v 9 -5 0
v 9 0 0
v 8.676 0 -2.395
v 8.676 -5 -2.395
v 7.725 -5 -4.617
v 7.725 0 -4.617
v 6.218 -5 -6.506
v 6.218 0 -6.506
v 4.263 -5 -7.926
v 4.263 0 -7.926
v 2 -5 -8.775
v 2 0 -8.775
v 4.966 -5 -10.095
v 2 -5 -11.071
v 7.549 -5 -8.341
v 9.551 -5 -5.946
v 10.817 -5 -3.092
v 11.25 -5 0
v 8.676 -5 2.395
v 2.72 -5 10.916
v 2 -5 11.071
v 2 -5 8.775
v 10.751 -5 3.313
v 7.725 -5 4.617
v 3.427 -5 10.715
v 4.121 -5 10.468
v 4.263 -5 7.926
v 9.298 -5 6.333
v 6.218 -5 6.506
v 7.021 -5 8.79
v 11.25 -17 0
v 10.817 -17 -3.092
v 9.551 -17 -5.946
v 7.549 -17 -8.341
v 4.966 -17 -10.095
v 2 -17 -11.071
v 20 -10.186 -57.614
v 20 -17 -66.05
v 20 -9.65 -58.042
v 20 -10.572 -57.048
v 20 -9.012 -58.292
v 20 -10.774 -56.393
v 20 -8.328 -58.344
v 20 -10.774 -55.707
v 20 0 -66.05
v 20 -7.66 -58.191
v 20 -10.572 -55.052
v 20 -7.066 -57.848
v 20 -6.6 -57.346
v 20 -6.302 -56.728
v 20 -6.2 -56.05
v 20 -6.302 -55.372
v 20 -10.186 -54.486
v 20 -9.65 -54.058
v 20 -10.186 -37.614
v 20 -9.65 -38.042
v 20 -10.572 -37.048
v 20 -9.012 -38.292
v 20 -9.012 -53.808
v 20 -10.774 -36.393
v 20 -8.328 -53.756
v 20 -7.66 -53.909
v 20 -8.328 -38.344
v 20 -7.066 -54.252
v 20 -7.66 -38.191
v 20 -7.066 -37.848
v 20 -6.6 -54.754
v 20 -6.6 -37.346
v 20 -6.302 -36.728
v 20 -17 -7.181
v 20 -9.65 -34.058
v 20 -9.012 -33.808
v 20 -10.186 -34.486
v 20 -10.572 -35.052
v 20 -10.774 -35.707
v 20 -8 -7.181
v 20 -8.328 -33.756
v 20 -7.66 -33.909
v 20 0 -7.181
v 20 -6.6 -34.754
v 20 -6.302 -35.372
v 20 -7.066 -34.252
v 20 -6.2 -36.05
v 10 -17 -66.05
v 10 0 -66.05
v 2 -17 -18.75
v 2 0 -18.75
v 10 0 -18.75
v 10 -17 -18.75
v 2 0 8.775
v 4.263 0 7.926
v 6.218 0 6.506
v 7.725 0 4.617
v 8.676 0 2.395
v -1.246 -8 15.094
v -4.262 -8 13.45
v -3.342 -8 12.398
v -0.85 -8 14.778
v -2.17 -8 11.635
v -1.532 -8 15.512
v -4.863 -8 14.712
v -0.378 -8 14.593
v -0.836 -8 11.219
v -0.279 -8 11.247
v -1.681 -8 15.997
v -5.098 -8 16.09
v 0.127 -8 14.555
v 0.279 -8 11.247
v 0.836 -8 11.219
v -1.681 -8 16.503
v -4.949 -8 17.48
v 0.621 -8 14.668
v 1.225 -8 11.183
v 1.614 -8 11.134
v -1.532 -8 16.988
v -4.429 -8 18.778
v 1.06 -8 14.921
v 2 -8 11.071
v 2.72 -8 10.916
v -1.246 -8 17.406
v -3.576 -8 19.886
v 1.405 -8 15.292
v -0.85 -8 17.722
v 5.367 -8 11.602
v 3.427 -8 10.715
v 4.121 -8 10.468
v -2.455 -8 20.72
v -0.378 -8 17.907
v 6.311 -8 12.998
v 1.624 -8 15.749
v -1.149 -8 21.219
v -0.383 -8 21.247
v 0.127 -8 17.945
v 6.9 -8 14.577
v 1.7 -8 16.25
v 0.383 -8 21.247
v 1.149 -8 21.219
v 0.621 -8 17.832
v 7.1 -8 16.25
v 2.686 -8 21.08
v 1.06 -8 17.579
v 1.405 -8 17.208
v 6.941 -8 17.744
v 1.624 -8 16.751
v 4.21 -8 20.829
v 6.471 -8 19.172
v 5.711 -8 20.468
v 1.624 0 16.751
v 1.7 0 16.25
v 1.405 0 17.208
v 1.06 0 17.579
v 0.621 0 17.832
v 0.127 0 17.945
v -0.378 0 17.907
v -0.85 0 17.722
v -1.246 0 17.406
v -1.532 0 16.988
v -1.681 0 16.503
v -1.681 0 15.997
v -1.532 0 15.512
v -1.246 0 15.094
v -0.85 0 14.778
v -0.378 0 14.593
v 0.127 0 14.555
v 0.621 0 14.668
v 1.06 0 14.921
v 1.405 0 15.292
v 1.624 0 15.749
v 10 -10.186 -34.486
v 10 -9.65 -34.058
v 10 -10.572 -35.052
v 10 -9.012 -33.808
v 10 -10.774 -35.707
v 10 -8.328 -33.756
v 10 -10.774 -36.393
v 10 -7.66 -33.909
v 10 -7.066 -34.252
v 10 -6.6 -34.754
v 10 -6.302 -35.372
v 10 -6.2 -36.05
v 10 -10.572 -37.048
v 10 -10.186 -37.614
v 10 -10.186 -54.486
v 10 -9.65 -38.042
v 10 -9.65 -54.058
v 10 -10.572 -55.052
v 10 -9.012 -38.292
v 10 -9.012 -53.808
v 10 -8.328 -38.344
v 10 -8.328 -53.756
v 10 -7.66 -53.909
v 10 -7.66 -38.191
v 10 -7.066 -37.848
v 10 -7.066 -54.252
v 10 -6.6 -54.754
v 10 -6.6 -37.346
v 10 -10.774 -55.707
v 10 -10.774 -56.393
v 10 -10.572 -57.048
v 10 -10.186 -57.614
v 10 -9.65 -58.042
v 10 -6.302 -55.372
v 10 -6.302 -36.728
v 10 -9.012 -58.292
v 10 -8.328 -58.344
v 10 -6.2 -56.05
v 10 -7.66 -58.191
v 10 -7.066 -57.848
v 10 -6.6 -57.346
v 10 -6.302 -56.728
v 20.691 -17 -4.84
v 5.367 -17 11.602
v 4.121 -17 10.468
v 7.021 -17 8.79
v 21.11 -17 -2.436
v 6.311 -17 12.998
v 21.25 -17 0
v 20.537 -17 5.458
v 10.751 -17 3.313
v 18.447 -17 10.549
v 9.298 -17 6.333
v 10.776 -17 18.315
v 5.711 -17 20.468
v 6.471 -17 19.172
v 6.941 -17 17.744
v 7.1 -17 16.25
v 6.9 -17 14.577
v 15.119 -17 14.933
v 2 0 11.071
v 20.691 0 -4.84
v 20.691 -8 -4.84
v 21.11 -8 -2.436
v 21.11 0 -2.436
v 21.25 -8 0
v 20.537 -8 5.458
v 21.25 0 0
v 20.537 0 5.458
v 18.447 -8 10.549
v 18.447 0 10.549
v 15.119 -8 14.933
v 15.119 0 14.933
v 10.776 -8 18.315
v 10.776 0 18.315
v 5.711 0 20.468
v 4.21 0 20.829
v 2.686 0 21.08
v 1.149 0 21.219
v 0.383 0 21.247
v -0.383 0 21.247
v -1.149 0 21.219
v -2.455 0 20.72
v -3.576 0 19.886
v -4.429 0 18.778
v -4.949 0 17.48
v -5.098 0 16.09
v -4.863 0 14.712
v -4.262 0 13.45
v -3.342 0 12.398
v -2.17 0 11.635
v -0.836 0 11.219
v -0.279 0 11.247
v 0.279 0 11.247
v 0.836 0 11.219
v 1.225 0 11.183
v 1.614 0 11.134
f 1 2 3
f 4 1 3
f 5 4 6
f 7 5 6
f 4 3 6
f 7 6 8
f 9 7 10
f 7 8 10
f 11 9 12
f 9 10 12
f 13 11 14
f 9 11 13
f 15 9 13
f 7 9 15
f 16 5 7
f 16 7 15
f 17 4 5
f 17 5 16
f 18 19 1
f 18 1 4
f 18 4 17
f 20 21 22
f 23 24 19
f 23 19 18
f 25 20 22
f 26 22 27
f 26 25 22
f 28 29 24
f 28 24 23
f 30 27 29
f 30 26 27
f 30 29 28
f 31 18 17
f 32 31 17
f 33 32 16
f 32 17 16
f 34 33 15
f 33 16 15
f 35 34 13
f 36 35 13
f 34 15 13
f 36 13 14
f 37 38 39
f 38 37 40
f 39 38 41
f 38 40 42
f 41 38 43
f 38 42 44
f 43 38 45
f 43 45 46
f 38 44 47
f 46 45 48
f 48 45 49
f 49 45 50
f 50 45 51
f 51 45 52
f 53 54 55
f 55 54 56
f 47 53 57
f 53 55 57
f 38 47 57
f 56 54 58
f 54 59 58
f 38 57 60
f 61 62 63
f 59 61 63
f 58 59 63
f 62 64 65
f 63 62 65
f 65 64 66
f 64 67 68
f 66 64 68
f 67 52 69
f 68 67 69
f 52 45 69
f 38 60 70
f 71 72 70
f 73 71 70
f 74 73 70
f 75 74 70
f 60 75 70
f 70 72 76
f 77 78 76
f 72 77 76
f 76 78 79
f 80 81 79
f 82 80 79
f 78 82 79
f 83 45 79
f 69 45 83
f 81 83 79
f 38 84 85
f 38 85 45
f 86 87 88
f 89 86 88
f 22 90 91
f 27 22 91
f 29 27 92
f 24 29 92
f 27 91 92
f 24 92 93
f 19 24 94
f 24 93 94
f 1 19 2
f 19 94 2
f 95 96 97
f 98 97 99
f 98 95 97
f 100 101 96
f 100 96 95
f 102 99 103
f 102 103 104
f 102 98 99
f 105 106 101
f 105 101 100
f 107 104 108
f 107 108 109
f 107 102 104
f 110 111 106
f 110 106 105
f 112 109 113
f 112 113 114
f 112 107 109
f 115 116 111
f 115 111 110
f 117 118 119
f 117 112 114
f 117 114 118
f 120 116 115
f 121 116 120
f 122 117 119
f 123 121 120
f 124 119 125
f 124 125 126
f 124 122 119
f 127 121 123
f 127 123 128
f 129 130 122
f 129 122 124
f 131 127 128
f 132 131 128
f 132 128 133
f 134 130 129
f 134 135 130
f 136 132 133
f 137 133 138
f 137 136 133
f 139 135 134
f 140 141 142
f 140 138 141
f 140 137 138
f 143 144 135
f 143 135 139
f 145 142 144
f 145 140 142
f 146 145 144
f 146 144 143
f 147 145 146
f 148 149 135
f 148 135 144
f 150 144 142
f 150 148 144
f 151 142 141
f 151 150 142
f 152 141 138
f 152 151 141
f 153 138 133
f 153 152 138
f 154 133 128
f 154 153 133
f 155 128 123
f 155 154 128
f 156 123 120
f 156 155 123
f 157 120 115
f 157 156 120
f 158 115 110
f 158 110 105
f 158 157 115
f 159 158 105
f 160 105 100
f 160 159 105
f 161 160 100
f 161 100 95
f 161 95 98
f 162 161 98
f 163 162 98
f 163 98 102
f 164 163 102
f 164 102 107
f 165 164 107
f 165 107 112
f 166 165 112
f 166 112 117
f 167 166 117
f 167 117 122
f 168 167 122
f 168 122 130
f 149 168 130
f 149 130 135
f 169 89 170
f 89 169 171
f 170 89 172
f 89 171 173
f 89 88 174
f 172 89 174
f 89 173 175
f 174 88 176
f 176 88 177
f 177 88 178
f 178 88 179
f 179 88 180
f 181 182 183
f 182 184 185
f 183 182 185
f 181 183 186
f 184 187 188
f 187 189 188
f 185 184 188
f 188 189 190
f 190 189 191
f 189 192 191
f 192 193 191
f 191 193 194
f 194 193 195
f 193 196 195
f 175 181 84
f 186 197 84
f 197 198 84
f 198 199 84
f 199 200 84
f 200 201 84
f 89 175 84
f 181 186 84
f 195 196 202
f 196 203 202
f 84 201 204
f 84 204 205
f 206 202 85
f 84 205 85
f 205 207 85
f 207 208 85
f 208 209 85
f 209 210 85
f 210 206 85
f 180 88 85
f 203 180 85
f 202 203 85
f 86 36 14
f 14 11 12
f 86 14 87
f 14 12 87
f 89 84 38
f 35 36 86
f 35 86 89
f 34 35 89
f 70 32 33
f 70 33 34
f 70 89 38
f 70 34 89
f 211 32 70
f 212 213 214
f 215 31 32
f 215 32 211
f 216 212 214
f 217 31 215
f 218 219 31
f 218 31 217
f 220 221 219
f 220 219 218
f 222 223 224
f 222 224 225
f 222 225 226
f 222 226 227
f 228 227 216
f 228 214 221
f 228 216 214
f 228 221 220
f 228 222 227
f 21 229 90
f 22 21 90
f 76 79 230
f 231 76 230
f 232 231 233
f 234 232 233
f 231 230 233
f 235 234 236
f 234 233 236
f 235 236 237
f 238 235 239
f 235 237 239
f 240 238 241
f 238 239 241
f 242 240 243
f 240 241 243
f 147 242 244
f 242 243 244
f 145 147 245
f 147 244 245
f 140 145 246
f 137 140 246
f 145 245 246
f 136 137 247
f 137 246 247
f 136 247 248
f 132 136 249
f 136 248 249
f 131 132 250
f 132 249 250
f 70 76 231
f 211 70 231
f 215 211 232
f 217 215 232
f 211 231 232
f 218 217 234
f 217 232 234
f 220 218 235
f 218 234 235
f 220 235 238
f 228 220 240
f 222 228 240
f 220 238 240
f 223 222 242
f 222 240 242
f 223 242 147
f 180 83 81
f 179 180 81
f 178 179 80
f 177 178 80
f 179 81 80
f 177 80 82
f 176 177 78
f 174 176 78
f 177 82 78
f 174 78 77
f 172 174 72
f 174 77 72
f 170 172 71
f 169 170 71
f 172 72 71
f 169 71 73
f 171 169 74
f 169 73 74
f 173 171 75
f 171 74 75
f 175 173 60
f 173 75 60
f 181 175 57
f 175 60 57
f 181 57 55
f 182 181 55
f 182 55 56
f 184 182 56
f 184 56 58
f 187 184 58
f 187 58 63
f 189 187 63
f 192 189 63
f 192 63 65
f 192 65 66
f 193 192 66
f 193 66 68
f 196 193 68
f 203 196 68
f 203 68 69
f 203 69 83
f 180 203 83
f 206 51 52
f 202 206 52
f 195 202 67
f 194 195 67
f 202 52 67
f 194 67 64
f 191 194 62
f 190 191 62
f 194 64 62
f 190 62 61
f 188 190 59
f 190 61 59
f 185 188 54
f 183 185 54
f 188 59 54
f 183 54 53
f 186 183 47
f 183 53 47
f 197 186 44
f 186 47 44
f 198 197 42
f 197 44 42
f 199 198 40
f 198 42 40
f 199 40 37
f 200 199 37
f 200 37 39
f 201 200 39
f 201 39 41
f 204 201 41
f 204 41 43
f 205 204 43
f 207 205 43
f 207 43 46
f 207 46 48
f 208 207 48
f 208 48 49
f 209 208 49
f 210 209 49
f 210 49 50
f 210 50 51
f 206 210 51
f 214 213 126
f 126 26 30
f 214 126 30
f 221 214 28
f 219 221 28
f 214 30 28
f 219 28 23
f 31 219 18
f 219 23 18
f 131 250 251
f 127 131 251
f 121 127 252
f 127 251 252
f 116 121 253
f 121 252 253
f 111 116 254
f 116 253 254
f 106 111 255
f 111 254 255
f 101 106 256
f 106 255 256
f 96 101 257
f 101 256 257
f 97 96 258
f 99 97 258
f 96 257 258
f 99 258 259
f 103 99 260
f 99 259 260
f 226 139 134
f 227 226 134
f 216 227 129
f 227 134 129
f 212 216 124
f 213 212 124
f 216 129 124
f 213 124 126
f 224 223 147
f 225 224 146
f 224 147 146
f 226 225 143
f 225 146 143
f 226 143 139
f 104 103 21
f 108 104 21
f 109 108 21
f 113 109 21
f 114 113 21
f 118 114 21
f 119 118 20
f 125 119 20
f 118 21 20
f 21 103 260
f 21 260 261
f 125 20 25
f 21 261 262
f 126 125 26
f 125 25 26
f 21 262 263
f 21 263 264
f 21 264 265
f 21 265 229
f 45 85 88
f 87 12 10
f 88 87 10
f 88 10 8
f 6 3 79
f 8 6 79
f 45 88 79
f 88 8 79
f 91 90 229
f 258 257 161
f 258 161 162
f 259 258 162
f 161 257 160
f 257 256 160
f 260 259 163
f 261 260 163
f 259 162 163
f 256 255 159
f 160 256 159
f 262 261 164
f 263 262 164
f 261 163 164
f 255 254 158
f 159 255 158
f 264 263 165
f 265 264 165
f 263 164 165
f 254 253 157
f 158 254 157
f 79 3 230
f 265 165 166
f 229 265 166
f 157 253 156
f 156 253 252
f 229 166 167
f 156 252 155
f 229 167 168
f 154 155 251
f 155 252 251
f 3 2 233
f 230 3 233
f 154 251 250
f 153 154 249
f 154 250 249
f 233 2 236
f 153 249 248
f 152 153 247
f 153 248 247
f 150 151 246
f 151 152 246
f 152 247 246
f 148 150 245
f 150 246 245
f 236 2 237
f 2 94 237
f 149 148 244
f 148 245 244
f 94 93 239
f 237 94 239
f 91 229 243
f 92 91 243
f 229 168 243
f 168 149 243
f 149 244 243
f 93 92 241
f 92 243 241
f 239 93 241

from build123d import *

# Parameters (mm, degrees)
F0_R     = 1.7
F1_DEPTH = 5
F2_DEPTH = 8
F3_DEPTH = 17
F4_R     = 2.3
F5_DEPTH = 25


with BuildPart() as f1:
    # F0 (on Front) → F1 (new body)
    with BuildSketch(Plane.XZ):
        with BuildLine():
            ThreePointArc((4.1207105035, 10.4681538462), (9.2984002163, 6.3326340032), (11.25, 0))
            ThreePointArc((11.25, 0), (8.6331483249, -7.2132690231), (2, -11.0707949127))
            Line((2, -11.0707949127), (2, -18.75))
            Line((2, -18.75), (10, -18.75))
            ThreePointArc((10, -18.75), (16.0767582704, -13.8960549623), (20, -7.1807033082))
            ThreePointArc((20, -7.1807033082), (20.9351677806, -3.6443449343), (21.25, 0))
            ThreePointArc((21.25, 0), (16.9251932479, 12.8491374621), (5.7111450805, 20.4681538462))
            ThreePointArc((5.7111450805, 20.4681538462), (6.7438538712, 18.470458278), (7.1, 16.25))
            ThreePointArc((7.1, 16.25), (6.3113803789, 12.9978502936), (4.1207105035, 10.4681538462))
        make_face()
        with BuildLine():
            ThreePointArc((2, 11.0707949127), (3.0751533833, 10.8215494117), (4.1207105035, 10.4681538462))
            ThreePointArc((4.1207105035, 10.4681538462), (6.3113803789, 12.9978502936), (7.1, 16.25))
            ThreePointArc((7.1, 16.25), (6.7438538712, 18.470458278), (5.7111450805, 20.4681538462))
            ThreePointArc((5.7111450805, 20.4681538462), (3.4504663185, 20.9679942337), (1.1488269912, 21.2189230769))
            ThreePointArc((1.1488269912, 21.2189230769), (3.9918052091, 19.4241914203), (5.1, 16.25))
            ThreePointArc((5.1, 16.25), (3.8904803589, 12.9524004827), (0.8356225189, 11.2189230769))
            ThreePointArc((0.8356225189, 11.2189230769), (1.4197444332, 11.1600549167), (2, 11.0707949127))
        make_face()
        with BuildLine():
            ThreePointArc((-0.8356225189, 11.2189230769), (0, 11.25), (0.8356225189, 11.2189230769))
            ThreePointArc((0.8356225189, 11.2189230769), (3.8904803589, 12.9524004827), (5.1, 16.25))
            ThreePointArc((5.1, 16.25), (3.9918052091, 19.4241914203), (1.1488269912, 21.2189230769))
            ThreePointArc((1.1488269912, 21.2189230769), (0, 21.25), (-1.1488269912, 21.2189230769))
            ThreePointArc((-1.1488269912, 21.2189230769), (-5.0975003643, 16.0903440089), (-0.8356225189, 11.2189230769))
        make_face()
        with Locations((0, 16.25)):
            Circle(F0_R, mode=Mode.SUBTRACT)
        with BuildLine():
            ThreePointArc((2, -11.0707949127), (8.6331483249, -7.2132690231), (11.25, 0))
            ThreePointArc((11.25, 0), (9.2984002163, 6.3326340032), (4.1207105035, 10.4681538462))
            ThreePointArc((4.1207105035, 10.4681538462), (3.1034384471, 9.864182135), (2, 9.4375114679))
            Line((2, 9.4375114679), (2, 8.7749643874))
            ThreePointArc((2, 8.7749643874), (7.0356236397, 5.6124860802), (9, 0))
            ThreePointArc((9, 0), (7.0356236397, -5.6124860802), (2, -8.7749643874))
            Line((2, -8.7749643874), (2, -11.0707949127))
        make_face()
        with BuildLine():
            ThreePointArc((2, 9.4375114679), (3.1034384471, 9.864182135), (4.1207105035, 10.4681538462))
            ThreePointArc((4.1207105035, 10.4681538462), (3.0751533833, 10.8215494117), (2, 11.0707949127))
            Line((2, 11.0707949127), (2, 9.4375114679))
        make_face()
        with BuildLine():
            ThreePointArc((20, -7.1807033082), (16.0767582704, -13.8960549623), (10, -18.75))
            Line((10, -18.75), (10, -66.05))
            Line((10, -66.05), (20, -66.05))
            Line((20, -66.05), (20, -7.1807033082))
        make_face()
    extrude(amount=F1_DEPTH)

    # F0 (on Front) → F2 (join)
    with BuildSketch(Plane.XZ):
        with BuildLine():
            ThreePointArc((4.1207105035, 10.4681538462), (9.2984002163, 6.3326340032), (11.25, 0))
            ThreePointArc((11.25, 0), (8.6331483249, -7.2132690231), (2, -11.0707949127))
            Line((2, -11.0707949127), (2, -18.75))
            Line((2, -18.75), (10, -18.75))
            ThreePointArc((10, -18.75), (16.0767582704, -13.8960549623), (20, -7.1807033082))
            ThreePointArc((20, -7.1807033082), (20.9351677806, -3.6443449343), (21.25, 0))
            ThreePointArc((21.25, 0), (16.9251932479, 12.8491374621), (5.7111450805, 20.4681538462))
            ThreePointArc((5.7111450805, 20.4681538462), (6.7438538712, 18.470458278), (7.1, 16.25))
            ThreePointArc((7.1, 16.25), (6.3113803789, 12.9978502936), (4.1207105035, 10.4681538462))
        make_face()
        with BuildLine():
            ThreePointArc((2, 11.0707949127), (3.0751533833, 10.8215494117), (4.1207105035, 10.4681538462))
            ThreePointArc((4.1207105035, 10.4681538462), (6.3113803789, 12.9978502936), (7.1, 16.25))
            ThreePointArc((7.1, 16.25), (6.7438538712, 18.470458278), (5.7111450805, 20.4681538462))
            ThreePointArc((5.7111450805, 20.4681538462), (3.4504663185, 20.9679942337), (1.1488269912, 21.2189230769))
            ThreePointArc((1.1488269912, 21.2189230769), (3.9918052091, 19.4241914203), (5.1, 16.25))
            ThreePointArc((5.1, 16.25), (3.8904803589, 12.9524004827), (0.8356225189, 11.2189230769))
            ThreePointArc((0.8356225189, 11.2189230769), (1.4197444332, 11.1600549167), (2, 11.0707949127))
        make_face()
        with BuildLine():
            ThreePointArc((-0.8356225189, 11.2189230769), (0, 11.25), (0.8356225189, 11.2189230769))
            ThreePointArc((0.8356225189, 11.2189230769), (3.8904803589, 12.9524004827), (5.1, 16.25))
            ThreePointArc((5.1, 16.25), (3.9918052091, 19.4241914203), (1.1488269912, 21.2189230769))
            ThreePointArc((1.1488269912, 21.2189230769), (0, 21.25), (-1.1488269912, 21.2189230769))
            ThreePointArc((-1.1488269912, 21.2189230769), (-5.0975003643, 16.0903440089), (-0.8356225189, 11.2189230769))
        make_face()
        with Locations((0, 16.25)):
            Circle(F0_R, mode=Mode.SUBTRACT)
        with BuildLine():
            ThreePointArc((20, -7.1807033082), (16.0767582704, -13.8960549623), (10, -18.75))
            Line((10, -18.75), (10, -66.05))
            Line((10, -66.05), (20, -66.05))
            Line((20, -66.05), (20, -7.1807033082))
        make_face()
    extrude(amount=F2_DEPTH)

    # F0 (on Front) → F3 (join)
    with BuildSketch(Plane.XZ):
        with BuildLine():
            ThreePointArc((20, -7.1807033082), (16.0767582704, -13.8960549623), (10, -18.75))
            Line((10, -18.75), (10, -66.05))
            Line((10, -66.05), (20, -66.05))
            Line((20, -66.05), (20, -7.1807033082))
        make_face()
        with BuildLine():
            ThreePointArc((4.1207105035, 10.4681538462), (9.2984002163, 6.3326340032), (11.25, 0))
            ThreePointArc((11.25, 0), (8.6331483249, -7.2132690231), (2, -11.0707949127))
            Line((2, -11.0707949127), (2, -18.75))
            Line((2, -18.75), (10, -18.75))
            ThreePointArc((10, -18.75), (16.0767582704, -13.8960549623), (20, -7.1807033082))
            ThreePointArc((20, -7.1807033082), (20.9351677806, -3.6443449343), (21.25, 0))
            ThreePointArc((21.25, 0), (16.9251932479, 12.8491374621), (5.7111450805, 20.4681538462))
            ThreePointArc((5.7111450805, 20.4681538462), (6.7438538712, 18.470458278), (7.1, 16.25))
            ThreePointArc((7.1, 16.25), (6.3113803789, 12.9978502936), (4.1207105035, 10.4681538462))
        make_face()
    extrude(amount=F3_DEPTH)

    # F4 (on face) → F5 (cut)
    with BuildSketch(Plane.YZ.offset(20)):
        with Locations((-8.5, -56.05)):
            Circle(F4_R)
        with Locations((-8.5, -36.05)):
            Circle(F4_R)
    extrude(amount=-F5_DEPTH, mode=Mode.SUBTRACT)


solid = f1.part
